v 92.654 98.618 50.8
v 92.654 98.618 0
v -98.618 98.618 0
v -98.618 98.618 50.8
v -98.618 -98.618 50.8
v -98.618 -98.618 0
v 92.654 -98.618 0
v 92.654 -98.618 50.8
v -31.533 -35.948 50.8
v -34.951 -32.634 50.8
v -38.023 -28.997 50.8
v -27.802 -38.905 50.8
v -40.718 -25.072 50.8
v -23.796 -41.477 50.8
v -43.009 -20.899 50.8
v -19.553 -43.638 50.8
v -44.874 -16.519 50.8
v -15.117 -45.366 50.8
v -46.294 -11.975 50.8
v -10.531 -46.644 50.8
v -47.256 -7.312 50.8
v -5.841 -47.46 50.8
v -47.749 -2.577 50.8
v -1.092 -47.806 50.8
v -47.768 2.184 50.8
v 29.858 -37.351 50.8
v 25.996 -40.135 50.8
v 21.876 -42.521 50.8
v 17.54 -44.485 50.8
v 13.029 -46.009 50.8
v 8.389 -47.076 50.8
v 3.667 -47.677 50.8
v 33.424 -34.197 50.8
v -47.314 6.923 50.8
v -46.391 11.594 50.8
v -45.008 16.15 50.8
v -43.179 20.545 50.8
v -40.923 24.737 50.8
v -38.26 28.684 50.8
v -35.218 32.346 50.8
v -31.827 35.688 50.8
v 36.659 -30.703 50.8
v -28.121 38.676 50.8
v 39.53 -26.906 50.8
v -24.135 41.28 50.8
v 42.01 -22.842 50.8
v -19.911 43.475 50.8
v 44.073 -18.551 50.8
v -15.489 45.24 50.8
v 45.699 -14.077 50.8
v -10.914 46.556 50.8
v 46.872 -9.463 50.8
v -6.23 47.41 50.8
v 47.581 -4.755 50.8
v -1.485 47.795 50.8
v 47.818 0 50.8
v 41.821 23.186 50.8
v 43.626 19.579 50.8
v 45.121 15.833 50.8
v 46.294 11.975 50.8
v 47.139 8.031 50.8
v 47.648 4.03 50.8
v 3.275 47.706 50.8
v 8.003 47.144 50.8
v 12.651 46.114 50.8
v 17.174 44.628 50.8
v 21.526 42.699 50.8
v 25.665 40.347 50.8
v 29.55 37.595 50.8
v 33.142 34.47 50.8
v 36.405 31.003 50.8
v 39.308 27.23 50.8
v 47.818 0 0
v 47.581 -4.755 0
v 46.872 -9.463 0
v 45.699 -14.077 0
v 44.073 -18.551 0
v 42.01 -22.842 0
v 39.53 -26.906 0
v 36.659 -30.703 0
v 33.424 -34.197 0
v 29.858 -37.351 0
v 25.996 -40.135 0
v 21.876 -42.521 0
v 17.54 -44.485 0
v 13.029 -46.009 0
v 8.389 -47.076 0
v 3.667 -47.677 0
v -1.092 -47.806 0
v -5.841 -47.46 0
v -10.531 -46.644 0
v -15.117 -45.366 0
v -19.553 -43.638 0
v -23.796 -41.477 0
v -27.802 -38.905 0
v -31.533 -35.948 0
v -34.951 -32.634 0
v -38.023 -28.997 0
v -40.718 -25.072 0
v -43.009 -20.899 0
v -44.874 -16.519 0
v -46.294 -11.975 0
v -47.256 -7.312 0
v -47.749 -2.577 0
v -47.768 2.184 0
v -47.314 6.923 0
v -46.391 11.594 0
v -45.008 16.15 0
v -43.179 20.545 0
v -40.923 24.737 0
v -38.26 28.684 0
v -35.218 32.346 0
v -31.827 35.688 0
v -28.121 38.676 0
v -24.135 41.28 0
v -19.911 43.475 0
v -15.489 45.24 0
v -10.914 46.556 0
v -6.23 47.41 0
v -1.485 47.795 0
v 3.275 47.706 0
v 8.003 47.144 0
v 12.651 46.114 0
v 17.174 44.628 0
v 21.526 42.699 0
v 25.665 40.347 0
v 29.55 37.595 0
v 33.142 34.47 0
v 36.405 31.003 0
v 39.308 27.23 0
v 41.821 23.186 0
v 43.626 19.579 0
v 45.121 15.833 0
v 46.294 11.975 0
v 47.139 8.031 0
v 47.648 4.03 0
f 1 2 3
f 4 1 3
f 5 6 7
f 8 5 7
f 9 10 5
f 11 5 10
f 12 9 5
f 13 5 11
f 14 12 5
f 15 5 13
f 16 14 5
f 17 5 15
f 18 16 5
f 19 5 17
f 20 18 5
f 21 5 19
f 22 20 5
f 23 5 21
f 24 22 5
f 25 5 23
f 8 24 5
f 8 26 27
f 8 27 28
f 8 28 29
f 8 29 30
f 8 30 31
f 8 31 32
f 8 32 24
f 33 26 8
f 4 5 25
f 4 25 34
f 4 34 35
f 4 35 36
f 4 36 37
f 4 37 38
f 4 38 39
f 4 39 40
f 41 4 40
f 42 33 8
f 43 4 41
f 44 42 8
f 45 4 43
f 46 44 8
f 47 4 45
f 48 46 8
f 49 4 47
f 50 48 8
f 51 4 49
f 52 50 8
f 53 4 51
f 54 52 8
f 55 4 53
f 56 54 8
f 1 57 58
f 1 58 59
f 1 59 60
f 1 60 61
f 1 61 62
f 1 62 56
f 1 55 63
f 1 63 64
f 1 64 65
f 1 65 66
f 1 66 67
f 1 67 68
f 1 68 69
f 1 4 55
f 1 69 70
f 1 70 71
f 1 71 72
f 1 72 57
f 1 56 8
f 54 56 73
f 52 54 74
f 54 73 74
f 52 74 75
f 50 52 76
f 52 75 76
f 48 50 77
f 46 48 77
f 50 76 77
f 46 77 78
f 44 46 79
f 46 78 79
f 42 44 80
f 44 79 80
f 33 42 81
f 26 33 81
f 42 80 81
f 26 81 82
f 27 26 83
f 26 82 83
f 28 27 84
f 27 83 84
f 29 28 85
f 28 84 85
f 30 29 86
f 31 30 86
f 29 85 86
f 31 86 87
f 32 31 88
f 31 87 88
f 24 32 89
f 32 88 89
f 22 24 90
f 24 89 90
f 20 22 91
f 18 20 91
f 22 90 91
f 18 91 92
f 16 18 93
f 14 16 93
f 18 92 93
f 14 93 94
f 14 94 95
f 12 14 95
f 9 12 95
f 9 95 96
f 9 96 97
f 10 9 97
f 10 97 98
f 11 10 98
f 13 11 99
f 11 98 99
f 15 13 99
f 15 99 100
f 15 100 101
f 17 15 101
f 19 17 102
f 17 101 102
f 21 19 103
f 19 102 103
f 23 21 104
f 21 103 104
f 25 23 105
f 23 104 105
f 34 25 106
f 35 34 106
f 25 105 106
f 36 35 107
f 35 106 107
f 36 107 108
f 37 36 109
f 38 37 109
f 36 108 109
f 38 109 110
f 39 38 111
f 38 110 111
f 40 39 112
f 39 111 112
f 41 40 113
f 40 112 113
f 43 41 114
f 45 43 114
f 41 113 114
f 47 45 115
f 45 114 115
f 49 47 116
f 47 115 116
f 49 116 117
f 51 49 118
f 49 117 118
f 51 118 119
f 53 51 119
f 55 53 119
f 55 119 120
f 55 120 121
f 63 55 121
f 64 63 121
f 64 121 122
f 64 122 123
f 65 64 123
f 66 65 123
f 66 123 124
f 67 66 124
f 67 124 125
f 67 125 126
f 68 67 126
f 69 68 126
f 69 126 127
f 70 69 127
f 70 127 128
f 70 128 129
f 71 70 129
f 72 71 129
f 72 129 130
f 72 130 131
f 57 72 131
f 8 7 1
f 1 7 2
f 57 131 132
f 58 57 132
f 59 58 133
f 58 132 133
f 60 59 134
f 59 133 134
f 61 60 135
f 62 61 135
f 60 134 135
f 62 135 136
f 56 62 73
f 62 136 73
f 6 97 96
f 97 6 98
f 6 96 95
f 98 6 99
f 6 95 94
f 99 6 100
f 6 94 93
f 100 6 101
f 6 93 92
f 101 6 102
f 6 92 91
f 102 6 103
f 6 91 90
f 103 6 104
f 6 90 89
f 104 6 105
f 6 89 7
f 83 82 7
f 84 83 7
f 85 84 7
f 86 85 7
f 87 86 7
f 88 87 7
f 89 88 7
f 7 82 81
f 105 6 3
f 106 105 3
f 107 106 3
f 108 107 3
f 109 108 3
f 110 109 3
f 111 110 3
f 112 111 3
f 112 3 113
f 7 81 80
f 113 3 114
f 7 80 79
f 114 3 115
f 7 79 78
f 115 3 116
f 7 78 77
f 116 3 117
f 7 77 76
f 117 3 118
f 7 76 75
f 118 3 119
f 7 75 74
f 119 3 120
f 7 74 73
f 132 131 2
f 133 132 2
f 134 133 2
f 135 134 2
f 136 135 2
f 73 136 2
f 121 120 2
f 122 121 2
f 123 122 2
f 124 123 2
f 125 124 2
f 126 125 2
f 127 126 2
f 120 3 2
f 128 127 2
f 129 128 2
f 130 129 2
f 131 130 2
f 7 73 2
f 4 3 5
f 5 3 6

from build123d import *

# Parameters (mm, degrees)
F2_DEPTH = 50.8


# Not quite as in the source:
# - a variable given as a bare number and used for a length is read in inches; the dataset says mm whatever the document's units were


with BuildPart() as f2:
    # F1 (on Top) → F2 (new body)
    with BuildSketch(Plane.XY):
        Polygon((0, 98.61804), (-98.61804, 98.61804), (-98.61804, -98.61804), (92.65412, -98.61804), (92.65412, 98.61804), align=None)
        with BuildLine():
            ThreePointArc((47.81804, 0), (-46.2944321696, -11.9745772173), (41.82070094, 23.1860717313))
            ThreePointArc((41.82070094, 23.1860717313), (46.2944321696, 11.9745772173), (47.81804, 0))
        make_face(mode=Mode.SUBTRACT)
    extrude(amount=F2_DEPTH)


solid = f2.part
